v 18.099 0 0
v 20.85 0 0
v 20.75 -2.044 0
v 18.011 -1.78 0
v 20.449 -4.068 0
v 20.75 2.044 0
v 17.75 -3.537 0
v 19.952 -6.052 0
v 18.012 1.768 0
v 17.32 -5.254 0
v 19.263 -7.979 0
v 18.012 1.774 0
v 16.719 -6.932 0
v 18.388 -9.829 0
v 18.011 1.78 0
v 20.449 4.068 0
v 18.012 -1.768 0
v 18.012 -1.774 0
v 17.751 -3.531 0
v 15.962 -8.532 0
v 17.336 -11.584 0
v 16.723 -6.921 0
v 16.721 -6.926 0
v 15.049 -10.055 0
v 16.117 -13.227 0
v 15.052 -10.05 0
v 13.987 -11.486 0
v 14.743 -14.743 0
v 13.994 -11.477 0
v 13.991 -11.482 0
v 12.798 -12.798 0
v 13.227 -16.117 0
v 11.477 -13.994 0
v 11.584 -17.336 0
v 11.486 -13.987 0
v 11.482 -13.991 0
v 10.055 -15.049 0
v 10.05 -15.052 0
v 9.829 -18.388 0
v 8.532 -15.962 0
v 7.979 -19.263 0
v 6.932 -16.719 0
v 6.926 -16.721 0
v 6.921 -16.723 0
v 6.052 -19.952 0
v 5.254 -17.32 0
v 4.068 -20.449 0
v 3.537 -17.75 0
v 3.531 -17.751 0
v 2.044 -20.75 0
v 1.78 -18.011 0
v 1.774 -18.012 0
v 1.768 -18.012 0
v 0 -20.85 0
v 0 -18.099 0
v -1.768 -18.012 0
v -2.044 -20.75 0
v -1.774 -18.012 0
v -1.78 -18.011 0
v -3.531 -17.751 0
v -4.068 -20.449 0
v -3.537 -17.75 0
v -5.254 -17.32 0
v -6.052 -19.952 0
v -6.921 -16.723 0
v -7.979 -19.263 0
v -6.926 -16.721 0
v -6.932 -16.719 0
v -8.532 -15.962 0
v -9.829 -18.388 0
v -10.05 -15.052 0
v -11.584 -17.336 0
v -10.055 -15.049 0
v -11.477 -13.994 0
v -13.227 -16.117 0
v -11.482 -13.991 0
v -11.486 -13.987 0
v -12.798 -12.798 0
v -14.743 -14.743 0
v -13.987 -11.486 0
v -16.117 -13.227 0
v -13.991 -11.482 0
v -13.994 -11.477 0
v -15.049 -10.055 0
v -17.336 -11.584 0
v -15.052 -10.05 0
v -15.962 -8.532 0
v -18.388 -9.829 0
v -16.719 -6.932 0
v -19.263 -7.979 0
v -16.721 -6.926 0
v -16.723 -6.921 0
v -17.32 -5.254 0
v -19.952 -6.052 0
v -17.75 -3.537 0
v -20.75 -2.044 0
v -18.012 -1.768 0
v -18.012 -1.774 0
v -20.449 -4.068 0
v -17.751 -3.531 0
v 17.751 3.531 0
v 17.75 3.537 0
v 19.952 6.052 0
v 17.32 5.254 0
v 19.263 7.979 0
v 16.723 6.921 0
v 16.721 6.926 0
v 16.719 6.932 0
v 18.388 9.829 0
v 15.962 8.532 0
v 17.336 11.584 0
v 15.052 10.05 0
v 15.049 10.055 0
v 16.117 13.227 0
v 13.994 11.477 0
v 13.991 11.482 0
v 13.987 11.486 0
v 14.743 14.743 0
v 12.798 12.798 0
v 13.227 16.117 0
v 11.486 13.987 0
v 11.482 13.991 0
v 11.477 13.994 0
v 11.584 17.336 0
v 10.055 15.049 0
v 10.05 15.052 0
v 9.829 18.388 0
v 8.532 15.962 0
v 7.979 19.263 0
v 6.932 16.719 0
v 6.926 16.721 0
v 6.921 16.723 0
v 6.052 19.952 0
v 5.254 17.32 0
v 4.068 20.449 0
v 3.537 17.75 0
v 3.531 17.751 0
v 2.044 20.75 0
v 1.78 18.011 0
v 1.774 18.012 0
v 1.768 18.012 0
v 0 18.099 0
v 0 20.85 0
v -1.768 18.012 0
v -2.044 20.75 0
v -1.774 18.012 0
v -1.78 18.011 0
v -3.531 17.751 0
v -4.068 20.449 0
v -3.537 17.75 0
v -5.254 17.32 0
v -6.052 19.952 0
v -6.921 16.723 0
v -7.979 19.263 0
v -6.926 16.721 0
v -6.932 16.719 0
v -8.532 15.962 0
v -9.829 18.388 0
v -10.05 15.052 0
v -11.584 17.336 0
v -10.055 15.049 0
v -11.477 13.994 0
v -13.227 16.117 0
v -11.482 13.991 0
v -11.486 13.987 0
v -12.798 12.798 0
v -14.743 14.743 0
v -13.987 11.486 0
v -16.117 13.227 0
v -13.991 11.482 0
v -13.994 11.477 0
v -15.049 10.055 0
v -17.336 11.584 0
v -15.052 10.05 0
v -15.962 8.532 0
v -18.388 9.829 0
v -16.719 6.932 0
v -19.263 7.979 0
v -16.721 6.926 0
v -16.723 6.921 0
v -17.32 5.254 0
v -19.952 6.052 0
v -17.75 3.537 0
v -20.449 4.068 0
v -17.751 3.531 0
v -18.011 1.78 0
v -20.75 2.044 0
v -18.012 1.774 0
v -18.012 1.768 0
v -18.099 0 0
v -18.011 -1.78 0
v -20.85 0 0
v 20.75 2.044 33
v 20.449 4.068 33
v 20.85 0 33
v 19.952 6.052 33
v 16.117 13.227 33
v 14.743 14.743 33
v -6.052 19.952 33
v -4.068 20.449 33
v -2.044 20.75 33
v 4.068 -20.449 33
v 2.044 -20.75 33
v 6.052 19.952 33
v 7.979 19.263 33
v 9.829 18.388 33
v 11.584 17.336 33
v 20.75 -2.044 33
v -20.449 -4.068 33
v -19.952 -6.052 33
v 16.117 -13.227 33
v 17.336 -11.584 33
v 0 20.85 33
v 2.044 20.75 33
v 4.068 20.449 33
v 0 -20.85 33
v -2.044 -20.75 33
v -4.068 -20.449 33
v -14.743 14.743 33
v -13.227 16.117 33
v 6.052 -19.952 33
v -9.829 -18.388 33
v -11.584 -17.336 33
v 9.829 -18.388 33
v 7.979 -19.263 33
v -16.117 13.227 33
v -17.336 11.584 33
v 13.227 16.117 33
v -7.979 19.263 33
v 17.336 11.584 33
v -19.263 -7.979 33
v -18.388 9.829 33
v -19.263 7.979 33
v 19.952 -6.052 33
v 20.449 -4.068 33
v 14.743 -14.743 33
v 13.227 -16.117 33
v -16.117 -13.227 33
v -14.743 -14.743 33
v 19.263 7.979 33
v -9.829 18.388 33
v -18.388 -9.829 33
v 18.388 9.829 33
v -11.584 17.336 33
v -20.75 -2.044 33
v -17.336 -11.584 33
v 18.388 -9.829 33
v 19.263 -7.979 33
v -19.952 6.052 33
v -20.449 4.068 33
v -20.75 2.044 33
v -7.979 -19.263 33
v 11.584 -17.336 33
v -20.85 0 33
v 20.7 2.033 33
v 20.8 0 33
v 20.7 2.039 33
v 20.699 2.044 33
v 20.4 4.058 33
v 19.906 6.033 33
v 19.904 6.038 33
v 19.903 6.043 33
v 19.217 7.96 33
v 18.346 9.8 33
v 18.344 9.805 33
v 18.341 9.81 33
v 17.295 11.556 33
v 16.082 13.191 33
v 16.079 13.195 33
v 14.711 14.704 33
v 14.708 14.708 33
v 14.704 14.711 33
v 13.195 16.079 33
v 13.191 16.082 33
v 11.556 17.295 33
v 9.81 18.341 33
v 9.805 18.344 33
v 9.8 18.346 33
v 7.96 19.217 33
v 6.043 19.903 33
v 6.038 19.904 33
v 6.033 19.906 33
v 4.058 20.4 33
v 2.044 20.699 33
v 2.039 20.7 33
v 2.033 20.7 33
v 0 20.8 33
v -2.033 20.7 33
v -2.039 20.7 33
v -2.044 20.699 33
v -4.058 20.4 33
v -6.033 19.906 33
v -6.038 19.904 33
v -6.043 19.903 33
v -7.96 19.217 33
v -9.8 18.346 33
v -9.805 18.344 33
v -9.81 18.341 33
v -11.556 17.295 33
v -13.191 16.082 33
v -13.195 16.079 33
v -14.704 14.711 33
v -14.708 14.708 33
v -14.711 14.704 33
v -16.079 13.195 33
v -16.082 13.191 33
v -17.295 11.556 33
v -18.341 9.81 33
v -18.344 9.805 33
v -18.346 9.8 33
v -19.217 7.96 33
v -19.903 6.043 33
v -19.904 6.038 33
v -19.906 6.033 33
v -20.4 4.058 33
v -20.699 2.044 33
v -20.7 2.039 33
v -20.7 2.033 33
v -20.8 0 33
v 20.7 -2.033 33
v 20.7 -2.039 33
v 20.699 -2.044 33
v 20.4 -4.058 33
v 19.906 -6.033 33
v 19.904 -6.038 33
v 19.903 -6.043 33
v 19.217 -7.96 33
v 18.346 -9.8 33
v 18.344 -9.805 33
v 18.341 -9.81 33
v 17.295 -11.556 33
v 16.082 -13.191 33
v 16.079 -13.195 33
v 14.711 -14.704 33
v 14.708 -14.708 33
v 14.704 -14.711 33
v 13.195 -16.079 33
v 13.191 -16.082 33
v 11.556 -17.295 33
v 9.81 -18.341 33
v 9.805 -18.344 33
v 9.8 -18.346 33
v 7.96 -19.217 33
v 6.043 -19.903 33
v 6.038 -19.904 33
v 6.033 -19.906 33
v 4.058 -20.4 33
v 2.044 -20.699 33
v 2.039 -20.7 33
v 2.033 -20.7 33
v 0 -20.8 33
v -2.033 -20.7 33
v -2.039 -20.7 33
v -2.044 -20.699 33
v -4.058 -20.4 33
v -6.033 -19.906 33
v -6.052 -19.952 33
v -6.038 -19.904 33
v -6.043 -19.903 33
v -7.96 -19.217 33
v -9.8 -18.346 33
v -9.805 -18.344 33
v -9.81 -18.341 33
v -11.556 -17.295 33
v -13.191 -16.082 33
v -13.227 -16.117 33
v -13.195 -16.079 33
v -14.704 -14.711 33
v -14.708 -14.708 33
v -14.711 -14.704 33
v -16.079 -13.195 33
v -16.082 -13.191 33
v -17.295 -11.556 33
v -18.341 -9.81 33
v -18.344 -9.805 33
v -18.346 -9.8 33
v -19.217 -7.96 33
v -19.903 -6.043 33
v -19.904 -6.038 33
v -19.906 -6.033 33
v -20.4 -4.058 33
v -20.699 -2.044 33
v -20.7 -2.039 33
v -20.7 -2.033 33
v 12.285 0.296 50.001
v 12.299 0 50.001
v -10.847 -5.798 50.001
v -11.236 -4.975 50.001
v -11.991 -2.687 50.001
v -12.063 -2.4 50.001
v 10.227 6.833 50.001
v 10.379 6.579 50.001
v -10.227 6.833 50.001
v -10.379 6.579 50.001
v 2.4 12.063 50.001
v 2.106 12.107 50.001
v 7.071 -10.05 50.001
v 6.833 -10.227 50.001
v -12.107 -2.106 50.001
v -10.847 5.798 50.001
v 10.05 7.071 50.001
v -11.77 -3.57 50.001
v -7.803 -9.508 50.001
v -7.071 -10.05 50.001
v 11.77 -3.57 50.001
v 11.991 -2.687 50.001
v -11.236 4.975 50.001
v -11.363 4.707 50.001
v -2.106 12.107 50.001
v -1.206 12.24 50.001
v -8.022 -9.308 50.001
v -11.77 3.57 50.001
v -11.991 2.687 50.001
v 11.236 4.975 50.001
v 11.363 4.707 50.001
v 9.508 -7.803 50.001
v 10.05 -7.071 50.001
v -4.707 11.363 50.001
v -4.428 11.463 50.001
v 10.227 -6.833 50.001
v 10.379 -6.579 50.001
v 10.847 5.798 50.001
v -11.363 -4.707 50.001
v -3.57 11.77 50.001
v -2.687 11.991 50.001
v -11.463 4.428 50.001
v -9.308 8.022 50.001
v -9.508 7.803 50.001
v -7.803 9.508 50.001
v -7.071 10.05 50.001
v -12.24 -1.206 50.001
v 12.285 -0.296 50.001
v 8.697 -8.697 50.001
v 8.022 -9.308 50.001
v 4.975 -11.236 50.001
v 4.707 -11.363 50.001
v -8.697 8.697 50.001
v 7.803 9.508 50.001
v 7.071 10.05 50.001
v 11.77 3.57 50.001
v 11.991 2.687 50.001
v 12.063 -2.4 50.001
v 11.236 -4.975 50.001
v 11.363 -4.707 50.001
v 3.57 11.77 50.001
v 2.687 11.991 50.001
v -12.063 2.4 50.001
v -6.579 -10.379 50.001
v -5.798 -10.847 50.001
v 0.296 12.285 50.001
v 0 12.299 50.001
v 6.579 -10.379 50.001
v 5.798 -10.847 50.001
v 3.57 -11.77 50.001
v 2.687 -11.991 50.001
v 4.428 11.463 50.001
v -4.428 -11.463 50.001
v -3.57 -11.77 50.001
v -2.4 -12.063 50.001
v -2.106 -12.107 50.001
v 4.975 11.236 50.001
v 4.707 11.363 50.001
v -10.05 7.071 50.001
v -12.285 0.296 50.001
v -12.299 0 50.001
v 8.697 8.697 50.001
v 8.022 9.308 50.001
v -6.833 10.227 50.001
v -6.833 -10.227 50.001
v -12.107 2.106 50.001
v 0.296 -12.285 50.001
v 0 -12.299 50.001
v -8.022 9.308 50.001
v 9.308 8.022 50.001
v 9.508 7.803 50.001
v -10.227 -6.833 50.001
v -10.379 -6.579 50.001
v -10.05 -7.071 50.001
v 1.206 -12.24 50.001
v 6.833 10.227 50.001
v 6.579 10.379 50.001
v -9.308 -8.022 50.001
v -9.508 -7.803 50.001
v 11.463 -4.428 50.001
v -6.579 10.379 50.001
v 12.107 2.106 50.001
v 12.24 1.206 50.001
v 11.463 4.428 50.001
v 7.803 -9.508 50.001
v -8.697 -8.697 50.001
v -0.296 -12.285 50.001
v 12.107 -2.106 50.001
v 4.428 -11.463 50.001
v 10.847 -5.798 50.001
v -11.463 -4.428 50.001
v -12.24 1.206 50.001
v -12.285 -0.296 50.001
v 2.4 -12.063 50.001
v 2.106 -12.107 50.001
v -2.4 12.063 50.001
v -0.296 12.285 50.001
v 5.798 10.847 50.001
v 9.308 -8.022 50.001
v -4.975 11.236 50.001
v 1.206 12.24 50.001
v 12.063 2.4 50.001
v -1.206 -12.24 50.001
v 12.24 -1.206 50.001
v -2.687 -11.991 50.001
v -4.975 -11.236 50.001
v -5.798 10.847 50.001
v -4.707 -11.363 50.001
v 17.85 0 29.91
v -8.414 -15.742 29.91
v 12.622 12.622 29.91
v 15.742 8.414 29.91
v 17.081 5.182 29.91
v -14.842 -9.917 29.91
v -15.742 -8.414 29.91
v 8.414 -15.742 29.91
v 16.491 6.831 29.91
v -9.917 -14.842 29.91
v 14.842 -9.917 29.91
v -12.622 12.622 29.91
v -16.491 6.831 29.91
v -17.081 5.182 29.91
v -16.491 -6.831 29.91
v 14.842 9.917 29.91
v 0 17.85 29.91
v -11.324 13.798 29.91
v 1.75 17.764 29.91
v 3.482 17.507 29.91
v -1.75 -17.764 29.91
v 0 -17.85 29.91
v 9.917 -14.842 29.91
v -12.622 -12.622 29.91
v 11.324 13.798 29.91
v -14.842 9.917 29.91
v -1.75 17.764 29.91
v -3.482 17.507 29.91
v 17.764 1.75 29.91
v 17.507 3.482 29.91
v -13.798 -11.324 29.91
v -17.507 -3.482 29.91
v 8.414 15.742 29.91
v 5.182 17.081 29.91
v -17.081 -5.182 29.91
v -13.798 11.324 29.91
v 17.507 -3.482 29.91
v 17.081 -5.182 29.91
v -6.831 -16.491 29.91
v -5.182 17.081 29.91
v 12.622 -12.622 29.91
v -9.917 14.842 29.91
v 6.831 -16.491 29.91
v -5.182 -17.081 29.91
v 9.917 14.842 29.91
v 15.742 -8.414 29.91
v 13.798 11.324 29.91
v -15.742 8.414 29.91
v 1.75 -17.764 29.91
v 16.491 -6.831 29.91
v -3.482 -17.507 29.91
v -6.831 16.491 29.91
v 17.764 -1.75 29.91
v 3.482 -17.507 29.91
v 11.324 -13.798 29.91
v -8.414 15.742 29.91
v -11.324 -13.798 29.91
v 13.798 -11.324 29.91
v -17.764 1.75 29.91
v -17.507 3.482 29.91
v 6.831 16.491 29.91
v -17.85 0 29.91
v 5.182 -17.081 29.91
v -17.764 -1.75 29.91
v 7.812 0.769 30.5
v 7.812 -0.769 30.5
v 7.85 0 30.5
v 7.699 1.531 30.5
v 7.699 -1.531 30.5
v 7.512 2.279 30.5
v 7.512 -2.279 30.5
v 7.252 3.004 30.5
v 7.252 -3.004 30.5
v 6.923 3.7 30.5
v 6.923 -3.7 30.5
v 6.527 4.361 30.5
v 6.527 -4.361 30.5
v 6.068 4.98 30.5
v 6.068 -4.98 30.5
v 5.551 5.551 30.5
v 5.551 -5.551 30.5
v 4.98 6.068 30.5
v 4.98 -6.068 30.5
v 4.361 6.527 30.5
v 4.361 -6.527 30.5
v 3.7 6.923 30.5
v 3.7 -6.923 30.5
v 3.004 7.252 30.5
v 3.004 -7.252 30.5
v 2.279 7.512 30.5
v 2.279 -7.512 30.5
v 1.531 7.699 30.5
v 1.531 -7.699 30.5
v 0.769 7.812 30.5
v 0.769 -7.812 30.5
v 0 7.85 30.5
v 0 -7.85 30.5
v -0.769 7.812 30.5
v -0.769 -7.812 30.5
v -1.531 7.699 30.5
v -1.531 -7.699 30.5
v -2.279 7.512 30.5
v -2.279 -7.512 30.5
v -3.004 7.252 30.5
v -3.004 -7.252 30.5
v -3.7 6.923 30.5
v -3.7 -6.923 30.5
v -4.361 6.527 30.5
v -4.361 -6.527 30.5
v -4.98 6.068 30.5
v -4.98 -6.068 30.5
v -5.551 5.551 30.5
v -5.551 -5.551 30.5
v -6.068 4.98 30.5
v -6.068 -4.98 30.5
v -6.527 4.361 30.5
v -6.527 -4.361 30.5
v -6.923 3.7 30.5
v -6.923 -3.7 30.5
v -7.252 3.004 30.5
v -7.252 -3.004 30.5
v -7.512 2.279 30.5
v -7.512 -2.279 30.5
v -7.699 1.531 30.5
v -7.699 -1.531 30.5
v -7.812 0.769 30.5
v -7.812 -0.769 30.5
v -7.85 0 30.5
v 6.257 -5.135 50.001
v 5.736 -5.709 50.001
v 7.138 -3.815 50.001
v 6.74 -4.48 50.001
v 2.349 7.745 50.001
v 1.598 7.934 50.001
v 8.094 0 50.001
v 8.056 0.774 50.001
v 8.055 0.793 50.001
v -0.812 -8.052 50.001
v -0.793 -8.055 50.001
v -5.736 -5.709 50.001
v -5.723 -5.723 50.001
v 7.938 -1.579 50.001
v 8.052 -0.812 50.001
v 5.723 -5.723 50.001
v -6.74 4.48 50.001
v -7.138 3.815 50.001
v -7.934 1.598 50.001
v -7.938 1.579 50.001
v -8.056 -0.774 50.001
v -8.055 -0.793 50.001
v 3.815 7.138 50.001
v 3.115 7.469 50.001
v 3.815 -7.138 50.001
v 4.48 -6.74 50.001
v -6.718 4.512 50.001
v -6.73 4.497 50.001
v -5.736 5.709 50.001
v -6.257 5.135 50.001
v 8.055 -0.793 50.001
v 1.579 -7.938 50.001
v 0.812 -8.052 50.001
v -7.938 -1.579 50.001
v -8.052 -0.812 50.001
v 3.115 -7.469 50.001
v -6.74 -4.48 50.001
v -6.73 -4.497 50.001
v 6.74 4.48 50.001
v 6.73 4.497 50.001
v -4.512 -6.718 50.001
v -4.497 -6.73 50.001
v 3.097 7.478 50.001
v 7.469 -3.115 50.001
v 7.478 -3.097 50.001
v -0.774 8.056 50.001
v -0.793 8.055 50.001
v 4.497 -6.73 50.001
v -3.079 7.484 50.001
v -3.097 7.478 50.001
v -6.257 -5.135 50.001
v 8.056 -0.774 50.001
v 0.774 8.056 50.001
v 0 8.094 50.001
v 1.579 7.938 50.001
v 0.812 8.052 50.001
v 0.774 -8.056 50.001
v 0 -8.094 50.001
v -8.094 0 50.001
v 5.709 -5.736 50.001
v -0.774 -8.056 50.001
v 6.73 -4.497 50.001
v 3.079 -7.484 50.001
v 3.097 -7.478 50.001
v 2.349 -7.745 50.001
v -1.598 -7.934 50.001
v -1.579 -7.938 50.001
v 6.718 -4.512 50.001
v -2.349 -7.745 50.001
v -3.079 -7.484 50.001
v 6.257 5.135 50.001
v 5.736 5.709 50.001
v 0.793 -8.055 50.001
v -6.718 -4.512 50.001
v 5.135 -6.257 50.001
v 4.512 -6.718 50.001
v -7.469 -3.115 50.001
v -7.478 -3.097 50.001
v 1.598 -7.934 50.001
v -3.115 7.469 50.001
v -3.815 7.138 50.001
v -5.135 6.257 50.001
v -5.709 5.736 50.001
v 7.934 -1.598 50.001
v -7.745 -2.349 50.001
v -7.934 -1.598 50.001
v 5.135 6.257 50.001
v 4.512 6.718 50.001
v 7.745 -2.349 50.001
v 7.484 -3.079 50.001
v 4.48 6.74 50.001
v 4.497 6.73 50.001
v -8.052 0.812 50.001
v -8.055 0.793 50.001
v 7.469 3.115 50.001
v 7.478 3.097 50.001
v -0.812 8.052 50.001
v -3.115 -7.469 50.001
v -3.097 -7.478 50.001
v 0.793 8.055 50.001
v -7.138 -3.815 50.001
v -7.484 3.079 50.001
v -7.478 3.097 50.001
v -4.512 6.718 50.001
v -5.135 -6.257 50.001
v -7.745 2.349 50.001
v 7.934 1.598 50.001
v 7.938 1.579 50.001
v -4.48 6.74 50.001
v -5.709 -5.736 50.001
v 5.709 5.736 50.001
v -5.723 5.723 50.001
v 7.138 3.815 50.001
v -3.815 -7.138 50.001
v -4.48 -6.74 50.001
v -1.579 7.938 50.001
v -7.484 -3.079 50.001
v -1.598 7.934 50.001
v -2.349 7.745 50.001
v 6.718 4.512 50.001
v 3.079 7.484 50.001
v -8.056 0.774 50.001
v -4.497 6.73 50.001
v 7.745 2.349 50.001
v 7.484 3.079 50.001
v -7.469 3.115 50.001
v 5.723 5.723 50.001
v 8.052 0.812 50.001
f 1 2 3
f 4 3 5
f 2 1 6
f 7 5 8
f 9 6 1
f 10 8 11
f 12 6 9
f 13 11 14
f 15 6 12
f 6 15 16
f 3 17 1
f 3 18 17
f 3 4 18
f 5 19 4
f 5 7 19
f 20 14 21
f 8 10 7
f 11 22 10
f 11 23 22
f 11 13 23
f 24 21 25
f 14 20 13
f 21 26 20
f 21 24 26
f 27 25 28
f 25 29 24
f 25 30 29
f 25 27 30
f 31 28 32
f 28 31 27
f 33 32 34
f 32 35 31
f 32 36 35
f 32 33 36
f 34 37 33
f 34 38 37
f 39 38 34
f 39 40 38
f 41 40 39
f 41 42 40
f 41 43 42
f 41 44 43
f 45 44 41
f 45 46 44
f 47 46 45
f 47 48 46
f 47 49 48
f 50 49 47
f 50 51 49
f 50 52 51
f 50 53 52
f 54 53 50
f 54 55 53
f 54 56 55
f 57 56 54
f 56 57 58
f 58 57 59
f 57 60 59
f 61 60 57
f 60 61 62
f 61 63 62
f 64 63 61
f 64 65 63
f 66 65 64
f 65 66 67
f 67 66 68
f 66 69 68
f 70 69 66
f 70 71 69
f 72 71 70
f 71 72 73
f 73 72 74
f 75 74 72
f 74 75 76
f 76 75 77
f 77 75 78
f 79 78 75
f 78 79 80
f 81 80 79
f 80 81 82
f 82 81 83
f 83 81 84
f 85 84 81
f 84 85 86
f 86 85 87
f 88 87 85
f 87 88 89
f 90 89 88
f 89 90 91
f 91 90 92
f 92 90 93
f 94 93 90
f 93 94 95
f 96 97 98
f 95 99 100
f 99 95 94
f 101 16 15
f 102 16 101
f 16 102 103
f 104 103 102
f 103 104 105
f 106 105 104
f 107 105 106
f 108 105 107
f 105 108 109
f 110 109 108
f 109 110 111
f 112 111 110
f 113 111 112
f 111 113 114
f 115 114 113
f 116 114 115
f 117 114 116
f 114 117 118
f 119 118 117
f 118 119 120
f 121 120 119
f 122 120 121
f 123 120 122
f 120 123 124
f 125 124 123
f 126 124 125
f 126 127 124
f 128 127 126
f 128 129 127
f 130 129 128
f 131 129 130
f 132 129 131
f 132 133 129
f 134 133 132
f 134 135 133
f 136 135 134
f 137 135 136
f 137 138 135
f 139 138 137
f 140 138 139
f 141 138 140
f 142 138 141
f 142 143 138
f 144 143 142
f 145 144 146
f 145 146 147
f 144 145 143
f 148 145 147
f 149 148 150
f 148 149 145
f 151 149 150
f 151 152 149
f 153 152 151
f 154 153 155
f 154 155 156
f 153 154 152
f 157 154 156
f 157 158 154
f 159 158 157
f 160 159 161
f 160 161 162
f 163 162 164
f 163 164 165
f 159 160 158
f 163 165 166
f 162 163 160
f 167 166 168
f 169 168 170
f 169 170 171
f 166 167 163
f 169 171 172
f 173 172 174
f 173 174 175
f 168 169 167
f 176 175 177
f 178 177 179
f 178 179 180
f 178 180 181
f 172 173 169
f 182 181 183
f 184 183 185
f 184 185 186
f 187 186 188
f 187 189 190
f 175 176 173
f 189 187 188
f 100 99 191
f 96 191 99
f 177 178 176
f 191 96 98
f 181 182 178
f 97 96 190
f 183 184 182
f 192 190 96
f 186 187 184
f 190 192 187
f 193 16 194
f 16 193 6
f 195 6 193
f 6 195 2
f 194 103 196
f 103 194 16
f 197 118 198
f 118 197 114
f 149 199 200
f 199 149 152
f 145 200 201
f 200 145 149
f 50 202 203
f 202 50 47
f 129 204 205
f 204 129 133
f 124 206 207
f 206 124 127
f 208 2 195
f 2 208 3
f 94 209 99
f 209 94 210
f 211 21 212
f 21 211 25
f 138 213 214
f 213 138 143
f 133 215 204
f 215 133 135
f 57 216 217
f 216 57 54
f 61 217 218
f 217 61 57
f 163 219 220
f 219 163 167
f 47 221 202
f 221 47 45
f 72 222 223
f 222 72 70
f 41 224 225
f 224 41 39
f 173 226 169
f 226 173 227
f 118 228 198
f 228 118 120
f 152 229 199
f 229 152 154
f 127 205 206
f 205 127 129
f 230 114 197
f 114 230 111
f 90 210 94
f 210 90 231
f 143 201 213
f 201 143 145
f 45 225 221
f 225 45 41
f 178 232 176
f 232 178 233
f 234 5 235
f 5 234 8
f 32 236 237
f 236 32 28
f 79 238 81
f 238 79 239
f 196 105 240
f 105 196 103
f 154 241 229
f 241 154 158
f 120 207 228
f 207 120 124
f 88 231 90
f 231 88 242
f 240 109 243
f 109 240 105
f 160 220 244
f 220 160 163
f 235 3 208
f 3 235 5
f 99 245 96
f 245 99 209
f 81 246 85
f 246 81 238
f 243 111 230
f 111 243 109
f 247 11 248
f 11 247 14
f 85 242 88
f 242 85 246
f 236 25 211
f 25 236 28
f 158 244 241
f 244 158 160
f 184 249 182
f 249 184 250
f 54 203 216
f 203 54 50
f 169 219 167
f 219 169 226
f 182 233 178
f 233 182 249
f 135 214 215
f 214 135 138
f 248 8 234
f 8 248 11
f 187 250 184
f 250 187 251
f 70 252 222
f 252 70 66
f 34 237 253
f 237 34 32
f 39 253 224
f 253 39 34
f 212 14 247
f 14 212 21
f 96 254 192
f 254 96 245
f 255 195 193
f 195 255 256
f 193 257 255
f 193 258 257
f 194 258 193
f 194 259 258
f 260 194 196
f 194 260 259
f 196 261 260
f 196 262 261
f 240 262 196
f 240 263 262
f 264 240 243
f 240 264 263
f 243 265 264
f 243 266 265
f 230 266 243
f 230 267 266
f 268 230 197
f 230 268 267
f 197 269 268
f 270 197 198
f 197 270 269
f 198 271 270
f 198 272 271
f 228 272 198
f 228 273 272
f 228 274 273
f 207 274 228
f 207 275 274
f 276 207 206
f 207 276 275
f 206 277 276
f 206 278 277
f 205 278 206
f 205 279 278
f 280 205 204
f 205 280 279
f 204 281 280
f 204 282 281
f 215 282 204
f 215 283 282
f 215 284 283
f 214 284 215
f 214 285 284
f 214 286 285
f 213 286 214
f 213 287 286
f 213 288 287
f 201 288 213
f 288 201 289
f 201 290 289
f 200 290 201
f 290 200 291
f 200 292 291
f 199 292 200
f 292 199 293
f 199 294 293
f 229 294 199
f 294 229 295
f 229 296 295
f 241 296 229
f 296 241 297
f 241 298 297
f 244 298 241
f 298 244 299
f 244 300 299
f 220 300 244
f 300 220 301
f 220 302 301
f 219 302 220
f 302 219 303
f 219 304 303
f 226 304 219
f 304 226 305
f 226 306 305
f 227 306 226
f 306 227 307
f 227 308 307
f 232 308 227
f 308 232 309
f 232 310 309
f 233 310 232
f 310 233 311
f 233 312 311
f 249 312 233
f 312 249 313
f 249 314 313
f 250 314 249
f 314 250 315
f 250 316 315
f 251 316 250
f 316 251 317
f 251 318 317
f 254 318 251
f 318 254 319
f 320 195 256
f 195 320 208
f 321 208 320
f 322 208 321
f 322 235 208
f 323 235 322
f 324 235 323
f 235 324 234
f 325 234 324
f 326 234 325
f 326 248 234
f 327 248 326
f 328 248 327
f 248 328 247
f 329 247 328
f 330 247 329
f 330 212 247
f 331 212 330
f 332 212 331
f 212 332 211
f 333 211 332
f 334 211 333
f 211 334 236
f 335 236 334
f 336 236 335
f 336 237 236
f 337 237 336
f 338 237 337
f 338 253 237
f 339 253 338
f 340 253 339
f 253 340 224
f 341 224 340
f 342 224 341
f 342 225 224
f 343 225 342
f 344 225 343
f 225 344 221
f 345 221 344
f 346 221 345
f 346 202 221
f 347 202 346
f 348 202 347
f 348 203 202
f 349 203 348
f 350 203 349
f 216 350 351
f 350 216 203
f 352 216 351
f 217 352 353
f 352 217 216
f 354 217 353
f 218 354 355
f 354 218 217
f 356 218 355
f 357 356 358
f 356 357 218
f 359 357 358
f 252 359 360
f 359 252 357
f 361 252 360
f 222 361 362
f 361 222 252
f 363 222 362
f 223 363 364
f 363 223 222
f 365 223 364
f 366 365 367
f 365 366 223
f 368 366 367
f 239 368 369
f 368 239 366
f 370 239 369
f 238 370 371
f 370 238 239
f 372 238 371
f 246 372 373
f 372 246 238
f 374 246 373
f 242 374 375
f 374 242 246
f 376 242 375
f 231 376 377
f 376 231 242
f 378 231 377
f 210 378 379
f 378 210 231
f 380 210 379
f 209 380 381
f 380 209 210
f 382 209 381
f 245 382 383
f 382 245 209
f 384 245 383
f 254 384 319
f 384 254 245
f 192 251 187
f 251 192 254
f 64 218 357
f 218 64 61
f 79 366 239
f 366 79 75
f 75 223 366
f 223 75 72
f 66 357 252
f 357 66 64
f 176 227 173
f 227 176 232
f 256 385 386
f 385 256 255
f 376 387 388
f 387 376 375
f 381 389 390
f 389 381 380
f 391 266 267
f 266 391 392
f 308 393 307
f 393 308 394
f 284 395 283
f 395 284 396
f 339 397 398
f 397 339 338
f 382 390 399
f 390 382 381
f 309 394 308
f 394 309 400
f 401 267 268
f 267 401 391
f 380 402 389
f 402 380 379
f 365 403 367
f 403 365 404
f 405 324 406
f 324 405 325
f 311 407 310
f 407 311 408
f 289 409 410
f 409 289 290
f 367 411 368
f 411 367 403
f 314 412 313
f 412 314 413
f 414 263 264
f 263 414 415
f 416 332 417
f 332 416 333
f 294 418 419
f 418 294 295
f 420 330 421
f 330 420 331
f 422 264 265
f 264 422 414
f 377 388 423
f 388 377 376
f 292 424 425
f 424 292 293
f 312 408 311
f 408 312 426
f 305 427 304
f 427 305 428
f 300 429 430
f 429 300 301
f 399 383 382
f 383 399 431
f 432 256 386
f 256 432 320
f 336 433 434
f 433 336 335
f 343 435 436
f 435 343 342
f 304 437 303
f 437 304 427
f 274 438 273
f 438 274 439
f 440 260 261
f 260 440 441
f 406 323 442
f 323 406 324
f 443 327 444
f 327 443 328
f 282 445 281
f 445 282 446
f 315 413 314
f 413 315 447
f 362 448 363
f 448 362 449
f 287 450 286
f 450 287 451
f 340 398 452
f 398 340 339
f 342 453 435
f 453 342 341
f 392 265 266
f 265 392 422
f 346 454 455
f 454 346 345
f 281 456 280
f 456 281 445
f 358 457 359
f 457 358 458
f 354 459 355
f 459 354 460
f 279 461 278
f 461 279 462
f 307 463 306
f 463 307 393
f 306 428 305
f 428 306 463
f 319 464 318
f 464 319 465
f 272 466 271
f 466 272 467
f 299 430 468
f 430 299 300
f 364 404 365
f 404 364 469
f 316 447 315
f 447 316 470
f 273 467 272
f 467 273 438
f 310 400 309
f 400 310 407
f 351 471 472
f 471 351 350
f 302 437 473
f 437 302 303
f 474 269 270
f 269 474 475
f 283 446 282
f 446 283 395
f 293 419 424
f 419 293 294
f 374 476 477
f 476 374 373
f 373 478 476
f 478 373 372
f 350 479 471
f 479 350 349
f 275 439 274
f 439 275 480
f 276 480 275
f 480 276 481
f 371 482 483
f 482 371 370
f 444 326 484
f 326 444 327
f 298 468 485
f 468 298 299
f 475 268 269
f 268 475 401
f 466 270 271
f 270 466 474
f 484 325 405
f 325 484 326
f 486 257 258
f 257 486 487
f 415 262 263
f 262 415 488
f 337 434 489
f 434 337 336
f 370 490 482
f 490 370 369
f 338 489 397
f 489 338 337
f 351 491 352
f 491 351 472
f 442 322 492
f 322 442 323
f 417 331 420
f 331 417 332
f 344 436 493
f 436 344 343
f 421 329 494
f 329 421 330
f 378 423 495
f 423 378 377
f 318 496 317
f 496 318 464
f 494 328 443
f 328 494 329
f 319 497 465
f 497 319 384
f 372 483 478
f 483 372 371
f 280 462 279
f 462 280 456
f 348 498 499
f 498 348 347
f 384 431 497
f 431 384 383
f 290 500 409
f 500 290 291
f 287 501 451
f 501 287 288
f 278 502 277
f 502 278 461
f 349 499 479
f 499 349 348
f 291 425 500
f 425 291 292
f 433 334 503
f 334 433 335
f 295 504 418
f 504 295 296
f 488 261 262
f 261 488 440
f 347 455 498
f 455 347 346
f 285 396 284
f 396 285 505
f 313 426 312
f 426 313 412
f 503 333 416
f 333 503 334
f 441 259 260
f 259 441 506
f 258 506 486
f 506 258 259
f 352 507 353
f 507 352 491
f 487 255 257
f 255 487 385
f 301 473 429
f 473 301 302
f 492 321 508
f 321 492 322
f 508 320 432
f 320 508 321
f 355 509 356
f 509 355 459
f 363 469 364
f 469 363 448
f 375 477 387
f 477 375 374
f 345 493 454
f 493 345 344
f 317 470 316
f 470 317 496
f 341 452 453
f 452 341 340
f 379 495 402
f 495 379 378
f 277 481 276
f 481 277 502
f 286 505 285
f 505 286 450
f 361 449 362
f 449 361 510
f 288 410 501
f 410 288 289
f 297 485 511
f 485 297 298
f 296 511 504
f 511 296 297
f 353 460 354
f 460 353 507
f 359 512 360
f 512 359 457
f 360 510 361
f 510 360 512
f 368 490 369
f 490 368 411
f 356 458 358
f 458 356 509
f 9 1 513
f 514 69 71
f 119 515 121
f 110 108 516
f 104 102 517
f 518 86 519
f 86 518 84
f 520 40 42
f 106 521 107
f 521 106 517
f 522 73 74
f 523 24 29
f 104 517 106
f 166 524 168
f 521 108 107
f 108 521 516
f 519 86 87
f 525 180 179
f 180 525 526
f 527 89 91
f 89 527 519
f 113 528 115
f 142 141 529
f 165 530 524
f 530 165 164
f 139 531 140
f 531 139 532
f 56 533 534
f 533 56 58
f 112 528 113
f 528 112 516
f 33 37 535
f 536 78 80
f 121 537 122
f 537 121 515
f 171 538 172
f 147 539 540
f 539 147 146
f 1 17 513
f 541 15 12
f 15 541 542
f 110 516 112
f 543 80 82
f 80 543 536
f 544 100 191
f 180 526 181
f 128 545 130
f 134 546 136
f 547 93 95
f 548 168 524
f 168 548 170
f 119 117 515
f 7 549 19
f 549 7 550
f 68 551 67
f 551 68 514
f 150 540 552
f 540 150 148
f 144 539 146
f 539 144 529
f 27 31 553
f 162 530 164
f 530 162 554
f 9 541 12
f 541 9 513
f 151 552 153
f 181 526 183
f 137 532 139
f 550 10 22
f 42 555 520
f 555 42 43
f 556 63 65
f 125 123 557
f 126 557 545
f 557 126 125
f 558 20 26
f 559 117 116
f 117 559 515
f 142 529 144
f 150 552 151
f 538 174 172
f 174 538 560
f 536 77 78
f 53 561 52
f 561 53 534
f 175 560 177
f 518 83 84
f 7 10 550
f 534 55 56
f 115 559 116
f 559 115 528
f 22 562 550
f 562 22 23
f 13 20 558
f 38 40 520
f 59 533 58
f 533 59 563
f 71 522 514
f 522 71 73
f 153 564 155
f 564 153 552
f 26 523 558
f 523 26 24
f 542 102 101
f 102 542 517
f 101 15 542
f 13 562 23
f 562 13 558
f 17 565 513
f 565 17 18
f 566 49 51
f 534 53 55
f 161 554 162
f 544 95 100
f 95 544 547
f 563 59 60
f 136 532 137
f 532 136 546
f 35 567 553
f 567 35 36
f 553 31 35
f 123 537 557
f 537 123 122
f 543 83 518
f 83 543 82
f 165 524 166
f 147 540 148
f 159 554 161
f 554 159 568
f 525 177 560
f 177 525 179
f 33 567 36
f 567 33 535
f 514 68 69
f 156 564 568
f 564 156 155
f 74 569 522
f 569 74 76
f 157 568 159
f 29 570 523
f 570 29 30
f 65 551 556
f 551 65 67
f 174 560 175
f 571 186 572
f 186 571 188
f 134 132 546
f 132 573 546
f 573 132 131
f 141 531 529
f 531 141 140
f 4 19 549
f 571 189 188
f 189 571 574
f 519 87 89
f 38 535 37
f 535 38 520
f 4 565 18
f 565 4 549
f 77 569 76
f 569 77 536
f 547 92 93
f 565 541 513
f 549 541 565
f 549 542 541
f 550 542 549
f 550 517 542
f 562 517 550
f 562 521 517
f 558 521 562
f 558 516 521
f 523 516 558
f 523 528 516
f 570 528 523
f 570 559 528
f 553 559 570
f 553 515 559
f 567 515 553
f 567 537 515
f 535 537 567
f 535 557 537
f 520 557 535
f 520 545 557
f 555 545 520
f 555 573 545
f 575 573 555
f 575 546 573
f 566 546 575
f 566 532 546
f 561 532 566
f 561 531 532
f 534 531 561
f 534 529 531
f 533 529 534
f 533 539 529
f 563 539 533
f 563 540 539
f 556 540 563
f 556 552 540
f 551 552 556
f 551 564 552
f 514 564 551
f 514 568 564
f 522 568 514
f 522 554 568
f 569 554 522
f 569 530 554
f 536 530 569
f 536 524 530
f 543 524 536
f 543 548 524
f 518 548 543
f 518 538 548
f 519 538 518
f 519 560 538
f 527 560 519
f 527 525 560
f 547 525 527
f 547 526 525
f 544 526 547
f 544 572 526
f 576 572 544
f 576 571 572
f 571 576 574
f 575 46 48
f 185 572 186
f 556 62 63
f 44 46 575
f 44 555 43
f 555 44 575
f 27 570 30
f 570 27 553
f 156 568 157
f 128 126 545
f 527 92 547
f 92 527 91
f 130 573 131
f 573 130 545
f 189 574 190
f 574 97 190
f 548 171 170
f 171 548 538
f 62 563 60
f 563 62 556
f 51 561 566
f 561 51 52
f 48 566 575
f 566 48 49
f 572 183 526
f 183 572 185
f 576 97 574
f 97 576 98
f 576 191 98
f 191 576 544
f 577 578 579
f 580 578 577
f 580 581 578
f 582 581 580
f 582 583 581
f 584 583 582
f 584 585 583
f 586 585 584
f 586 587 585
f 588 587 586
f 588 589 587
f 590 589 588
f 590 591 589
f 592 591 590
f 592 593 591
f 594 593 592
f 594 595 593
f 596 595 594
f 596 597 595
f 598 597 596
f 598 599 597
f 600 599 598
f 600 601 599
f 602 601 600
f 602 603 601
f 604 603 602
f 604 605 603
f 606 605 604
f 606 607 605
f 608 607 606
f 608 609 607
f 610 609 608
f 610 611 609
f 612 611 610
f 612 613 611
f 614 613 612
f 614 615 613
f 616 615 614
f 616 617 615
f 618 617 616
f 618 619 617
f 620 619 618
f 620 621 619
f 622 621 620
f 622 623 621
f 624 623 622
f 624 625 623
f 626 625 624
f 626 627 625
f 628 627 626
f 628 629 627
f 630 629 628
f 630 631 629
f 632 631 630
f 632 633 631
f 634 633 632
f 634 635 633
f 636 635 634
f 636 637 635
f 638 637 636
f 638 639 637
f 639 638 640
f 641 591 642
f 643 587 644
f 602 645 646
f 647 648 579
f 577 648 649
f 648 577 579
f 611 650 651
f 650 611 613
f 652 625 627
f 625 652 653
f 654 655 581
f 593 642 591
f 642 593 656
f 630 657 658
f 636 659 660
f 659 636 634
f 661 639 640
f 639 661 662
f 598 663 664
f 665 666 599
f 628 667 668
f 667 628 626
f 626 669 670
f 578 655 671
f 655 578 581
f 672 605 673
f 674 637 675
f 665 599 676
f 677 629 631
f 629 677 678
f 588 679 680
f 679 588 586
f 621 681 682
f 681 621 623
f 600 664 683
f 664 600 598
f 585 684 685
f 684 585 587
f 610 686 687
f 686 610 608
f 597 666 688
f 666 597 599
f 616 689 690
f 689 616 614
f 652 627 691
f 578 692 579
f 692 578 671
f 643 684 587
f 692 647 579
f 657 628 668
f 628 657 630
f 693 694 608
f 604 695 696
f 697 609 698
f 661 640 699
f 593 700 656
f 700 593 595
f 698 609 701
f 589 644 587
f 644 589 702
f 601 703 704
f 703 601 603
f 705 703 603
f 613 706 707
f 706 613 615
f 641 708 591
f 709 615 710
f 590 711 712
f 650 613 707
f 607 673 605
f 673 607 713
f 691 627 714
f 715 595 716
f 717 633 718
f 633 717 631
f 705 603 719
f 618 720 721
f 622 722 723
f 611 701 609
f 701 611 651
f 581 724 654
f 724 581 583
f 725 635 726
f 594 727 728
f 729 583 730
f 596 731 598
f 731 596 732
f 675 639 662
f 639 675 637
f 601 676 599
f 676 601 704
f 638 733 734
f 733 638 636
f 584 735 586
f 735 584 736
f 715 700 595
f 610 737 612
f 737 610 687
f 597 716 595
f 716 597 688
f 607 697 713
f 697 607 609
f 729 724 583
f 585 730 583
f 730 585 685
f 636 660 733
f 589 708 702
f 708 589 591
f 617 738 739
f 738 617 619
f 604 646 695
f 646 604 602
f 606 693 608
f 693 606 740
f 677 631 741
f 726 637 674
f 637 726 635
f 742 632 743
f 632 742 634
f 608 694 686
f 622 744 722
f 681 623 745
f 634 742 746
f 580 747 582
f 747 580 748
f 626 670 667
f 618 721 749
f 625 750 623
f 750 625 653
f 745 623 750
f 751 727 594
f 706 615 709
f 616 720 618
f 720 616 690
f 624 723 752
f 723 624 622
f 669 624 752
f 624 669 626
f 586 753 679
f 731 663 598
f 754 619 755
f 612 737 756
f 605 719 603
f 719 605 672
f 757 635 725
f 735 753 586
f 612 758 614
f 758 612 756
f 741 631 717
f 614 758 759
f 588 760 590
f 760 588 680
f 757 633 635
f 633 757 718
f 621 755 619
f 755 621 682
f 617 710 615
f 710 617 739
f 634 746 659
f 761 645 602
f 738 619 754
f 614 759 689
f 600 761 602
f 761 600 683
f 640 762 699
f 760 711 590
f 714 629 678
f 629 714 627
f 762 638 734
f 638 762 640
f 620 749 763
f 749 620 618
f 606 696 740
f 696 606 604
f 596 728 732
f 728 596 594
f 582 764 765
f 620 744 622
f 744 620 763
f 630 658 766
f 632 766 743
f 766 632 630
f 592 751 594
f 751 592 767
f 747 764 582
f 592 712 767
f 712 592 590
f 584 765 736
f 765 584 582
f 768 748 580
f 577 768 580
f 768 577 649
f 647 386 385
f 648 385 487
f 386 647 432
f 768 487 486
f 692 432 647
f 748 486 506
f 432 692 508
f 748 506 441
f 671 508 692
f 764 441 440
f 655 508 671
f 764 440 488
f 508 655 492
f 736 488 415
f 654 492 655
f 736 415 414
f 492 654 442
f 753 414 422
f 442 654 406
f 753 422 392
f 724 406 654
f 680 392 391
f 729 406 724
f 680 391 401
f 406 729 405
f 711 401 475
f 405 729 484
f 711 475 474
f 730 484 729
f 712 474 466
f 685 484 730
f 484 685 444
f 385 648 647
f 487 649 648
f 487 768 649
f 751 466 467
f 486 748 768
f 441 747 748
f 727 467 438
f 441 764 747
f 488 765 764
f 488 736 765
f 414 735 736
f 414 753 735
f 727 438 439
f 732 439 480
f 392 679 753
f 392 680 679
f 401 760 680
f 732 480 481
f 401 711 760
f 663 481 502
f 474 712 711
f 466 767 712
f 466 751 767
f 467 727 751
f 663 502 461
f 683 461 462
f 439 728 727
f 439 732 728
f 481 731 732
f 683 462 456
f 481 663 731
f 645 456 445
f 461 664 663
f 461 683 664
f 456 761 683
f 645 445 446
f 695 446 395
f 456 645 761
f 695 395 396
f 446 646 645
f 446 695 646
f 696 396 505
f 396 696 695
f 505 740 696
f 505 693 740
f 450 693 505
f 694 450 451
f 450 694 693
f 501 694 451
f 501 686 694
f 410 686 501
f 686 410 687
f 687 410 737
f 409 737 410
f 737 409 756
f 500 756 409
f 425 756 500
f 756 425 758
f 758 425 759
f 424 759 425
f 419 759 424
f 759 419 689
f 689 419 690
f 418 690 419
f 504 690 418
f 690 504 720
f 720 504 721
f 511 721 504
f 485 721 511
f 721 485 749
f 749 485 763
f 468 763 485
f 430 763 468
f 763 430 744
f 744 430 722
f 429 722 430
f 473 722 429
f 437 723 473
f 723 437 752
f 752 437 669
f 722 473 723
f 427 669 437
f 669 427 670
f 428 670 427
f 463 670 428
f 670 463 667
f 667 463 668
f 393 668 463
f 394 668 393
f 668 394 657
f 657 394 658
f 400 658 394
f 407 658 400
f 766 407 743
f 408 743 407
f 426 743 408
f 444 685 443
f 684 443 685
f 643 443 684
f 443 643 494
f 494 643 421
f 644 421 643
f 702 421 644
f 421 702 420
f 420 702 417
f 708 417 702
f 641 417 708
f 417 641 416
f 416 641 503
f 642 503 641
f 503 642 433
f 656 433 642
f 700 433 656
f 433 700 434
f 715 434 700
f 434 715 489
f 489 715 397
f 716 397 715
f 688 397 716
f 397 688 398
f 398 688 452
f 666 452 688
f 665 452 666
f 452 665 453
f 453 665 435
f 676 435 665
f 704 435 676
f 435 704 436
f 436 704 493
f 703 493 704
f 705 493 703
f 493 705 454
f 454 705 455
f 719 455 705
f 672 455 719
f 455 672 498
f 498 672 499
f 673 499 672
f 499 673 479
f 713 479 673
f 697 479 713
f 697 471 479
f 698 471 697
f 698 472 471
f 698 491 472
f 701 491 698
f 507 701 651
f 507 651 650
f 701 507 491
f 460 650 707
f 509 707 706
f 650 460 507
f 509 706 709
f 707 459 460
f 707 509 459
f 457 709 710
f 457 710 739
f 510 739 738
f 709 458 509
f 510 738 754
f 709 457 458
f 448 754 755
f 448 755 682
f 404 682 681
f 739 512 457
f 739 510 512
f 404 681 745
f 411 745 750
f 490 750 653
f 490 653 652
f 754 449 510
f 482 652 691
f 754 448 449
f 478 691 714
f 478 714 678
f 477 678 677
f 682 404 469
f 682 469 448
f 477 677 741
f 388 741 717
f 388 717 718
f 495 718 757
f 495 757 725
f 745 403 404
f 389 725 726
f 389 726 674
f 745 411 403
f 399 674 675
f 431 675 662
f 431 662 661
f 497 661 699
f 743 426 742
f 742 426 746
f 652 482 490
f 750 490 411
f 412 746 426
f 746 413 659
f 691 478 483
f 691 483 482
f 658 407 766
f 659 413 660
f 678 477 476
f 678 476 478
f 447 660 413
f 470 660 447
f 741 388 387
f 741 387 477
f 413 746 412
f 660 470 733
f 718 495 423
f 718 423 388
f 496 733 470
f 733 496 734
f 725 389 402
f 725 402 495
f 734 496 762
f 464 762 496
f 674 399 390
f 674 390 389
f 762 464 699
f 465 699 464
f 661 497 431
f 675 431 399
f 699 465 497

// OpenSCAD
stuetz=0;       //supportmaterial 
cone=0;         //Form cone
brim=0;         //brim for print bed adhesion

fn=32;          //default for $fn

idb=15.25;      //some inner diameter
odb=22.43-.3;   

th=3;           //wall thickness
spiel=.7;       //margin (outlets will be that bigger)


// some diameters for my special parts
t_od=(12.01+12.47)/2;
t_id=8;
d_od=27.6; //od_deckel
d_h=7.84;

//example

adapter(
        35,            //diameter bigger inlet
        15,            //diameter smaller inlet
        30,            //length bigger inlet side
        20,            //length smaller inlet side
        cone=1         //outer conus form
        );
//adapter are closed by a 0.5 mm sheet for printability;
//bore them out in smaller diameter


//translate([0,34,0])adapter(odb,t_od,d_h,15,cone=1); //deckel();
//sensor1(cone=1,stuetz=1,brim=1);
//translate([0,34,0])adapter(odb,t_od,15,15,cone=1,brim=0);   //beutel, Schlauch


module sensor1(){    //special adapter with cable outlet
  difference(){
   adapter(d_od,t_od,d_h,15+8,stuetz=stuetz,cone=cone,brim=brim); 
   translate([0,0,d_h])
      rotate([0,60,0])
      translate([0,0,-4])
      cylinder(d=3,h=200,$fn=fn);
  }
}

module adapter(od1, od2,l,l2){
 
difference(){
      union(){
       if(brim>0){
        cylinder(d=od1+spiel+4*th,h=.5,$fn=fn*2); }
        
        cylinder(d=od1+spiel+2*th,h=l+th,$fn=fn*2);
         if(cone>0){
            translate([0,0,l+th-.1])
                cylinder(d1=od1+spiel+2*th,d2=od2+spiel+2*th,h=od1-od2,$fn=fn*2);     
             
             } 
        translate([0,0,l])
        cylinder(d=od2+spiel+2*th,h=l2,$fn=fn*2); 
          
      }
        translate([0,0,-.1])
        cylinder(d1=od1+spiel+.5,d2=od1+spiel,h=l+.01,$fn=fn*2); 
        translate([0,0,l+.5])
        cylinder(d1=od2+spiel,d2=od2+spiel,h=th,$fn=fn*2); 
        translate([0,0,l+.5])
        cylinder(d1=od2+spiel,d2=od2+spiel+.5,h=l2,$fn=fn*2); 
    translate([0,0,l+l2+.001])
       cylinder(d=od1+od2,h=l+l2);
    }   
    
   if(stuetz>0){
     difference(){
        cylinder(d1=od2+spiel+2,d2=od2+spiel+.5,h=l+.002,$fn=fn*2); 
        translate([0,0,+.5])
        cylinder(d1=od2+spiel,d2=od2+spiel+.5,h=l+.002,$fn=fn*2); 
    }   
       
   }
    
    
}

/////////////////////outdated modules
module deckel(){
d2=27.10;
d1=27.6;
dh=7.84;
difference(){
      union(){
        cylinder(d=d1+spiel+4*th,h=.5,$fn=fn*2); 
        cylinder(d1=d1+spiel+2*th,d2=d2+spiel+2*th,h=dh+th,$fn=fn*2); 
        translate([0,0,dh+.5])
        tube(t_od,20);
      }
        translate([0,0,-.1])
        cylinder(d1=d1+spiel,d2=d2+spiel,h=dh,$fn=fn*2); 
        translate([0,0,dh+.5])
        cylinder(d=t_od,h=dh,$fn=fn*2); 
      
    }    
    
}

module bag1(){
l1=25;    
    
    difference(){
       union(){
        cylinder(d=odb+2*th,h=l1,$fn=fn*2); 
       }       
        translate([0,0,-.1])
        cylinder(d1=odb+spiel+1,d2=odb,h=10,$fn=fn*2); 
        cylinder(d1=odb+spiel+1,d2=odb,h=l1+.2,$fn=fn*2); 
    }
}

module tube(od,l ){
l1=25;    
    
    difference(){
       union(){
        cylinder(d=od+4*th,h=.5,$fn=fn*2); 
        cylinder(d=od+2*th,h=l,$fn=fn*2); 
       }       
        translate([0,0,-.1])
        cylinder(d1=od+spiel+1,d2=od,h=l,$fn=fn*2); 
        cylinder(d1=od+spiel+1,d2=od,h=l+.2,$fn=fn*2); 
    }
}
